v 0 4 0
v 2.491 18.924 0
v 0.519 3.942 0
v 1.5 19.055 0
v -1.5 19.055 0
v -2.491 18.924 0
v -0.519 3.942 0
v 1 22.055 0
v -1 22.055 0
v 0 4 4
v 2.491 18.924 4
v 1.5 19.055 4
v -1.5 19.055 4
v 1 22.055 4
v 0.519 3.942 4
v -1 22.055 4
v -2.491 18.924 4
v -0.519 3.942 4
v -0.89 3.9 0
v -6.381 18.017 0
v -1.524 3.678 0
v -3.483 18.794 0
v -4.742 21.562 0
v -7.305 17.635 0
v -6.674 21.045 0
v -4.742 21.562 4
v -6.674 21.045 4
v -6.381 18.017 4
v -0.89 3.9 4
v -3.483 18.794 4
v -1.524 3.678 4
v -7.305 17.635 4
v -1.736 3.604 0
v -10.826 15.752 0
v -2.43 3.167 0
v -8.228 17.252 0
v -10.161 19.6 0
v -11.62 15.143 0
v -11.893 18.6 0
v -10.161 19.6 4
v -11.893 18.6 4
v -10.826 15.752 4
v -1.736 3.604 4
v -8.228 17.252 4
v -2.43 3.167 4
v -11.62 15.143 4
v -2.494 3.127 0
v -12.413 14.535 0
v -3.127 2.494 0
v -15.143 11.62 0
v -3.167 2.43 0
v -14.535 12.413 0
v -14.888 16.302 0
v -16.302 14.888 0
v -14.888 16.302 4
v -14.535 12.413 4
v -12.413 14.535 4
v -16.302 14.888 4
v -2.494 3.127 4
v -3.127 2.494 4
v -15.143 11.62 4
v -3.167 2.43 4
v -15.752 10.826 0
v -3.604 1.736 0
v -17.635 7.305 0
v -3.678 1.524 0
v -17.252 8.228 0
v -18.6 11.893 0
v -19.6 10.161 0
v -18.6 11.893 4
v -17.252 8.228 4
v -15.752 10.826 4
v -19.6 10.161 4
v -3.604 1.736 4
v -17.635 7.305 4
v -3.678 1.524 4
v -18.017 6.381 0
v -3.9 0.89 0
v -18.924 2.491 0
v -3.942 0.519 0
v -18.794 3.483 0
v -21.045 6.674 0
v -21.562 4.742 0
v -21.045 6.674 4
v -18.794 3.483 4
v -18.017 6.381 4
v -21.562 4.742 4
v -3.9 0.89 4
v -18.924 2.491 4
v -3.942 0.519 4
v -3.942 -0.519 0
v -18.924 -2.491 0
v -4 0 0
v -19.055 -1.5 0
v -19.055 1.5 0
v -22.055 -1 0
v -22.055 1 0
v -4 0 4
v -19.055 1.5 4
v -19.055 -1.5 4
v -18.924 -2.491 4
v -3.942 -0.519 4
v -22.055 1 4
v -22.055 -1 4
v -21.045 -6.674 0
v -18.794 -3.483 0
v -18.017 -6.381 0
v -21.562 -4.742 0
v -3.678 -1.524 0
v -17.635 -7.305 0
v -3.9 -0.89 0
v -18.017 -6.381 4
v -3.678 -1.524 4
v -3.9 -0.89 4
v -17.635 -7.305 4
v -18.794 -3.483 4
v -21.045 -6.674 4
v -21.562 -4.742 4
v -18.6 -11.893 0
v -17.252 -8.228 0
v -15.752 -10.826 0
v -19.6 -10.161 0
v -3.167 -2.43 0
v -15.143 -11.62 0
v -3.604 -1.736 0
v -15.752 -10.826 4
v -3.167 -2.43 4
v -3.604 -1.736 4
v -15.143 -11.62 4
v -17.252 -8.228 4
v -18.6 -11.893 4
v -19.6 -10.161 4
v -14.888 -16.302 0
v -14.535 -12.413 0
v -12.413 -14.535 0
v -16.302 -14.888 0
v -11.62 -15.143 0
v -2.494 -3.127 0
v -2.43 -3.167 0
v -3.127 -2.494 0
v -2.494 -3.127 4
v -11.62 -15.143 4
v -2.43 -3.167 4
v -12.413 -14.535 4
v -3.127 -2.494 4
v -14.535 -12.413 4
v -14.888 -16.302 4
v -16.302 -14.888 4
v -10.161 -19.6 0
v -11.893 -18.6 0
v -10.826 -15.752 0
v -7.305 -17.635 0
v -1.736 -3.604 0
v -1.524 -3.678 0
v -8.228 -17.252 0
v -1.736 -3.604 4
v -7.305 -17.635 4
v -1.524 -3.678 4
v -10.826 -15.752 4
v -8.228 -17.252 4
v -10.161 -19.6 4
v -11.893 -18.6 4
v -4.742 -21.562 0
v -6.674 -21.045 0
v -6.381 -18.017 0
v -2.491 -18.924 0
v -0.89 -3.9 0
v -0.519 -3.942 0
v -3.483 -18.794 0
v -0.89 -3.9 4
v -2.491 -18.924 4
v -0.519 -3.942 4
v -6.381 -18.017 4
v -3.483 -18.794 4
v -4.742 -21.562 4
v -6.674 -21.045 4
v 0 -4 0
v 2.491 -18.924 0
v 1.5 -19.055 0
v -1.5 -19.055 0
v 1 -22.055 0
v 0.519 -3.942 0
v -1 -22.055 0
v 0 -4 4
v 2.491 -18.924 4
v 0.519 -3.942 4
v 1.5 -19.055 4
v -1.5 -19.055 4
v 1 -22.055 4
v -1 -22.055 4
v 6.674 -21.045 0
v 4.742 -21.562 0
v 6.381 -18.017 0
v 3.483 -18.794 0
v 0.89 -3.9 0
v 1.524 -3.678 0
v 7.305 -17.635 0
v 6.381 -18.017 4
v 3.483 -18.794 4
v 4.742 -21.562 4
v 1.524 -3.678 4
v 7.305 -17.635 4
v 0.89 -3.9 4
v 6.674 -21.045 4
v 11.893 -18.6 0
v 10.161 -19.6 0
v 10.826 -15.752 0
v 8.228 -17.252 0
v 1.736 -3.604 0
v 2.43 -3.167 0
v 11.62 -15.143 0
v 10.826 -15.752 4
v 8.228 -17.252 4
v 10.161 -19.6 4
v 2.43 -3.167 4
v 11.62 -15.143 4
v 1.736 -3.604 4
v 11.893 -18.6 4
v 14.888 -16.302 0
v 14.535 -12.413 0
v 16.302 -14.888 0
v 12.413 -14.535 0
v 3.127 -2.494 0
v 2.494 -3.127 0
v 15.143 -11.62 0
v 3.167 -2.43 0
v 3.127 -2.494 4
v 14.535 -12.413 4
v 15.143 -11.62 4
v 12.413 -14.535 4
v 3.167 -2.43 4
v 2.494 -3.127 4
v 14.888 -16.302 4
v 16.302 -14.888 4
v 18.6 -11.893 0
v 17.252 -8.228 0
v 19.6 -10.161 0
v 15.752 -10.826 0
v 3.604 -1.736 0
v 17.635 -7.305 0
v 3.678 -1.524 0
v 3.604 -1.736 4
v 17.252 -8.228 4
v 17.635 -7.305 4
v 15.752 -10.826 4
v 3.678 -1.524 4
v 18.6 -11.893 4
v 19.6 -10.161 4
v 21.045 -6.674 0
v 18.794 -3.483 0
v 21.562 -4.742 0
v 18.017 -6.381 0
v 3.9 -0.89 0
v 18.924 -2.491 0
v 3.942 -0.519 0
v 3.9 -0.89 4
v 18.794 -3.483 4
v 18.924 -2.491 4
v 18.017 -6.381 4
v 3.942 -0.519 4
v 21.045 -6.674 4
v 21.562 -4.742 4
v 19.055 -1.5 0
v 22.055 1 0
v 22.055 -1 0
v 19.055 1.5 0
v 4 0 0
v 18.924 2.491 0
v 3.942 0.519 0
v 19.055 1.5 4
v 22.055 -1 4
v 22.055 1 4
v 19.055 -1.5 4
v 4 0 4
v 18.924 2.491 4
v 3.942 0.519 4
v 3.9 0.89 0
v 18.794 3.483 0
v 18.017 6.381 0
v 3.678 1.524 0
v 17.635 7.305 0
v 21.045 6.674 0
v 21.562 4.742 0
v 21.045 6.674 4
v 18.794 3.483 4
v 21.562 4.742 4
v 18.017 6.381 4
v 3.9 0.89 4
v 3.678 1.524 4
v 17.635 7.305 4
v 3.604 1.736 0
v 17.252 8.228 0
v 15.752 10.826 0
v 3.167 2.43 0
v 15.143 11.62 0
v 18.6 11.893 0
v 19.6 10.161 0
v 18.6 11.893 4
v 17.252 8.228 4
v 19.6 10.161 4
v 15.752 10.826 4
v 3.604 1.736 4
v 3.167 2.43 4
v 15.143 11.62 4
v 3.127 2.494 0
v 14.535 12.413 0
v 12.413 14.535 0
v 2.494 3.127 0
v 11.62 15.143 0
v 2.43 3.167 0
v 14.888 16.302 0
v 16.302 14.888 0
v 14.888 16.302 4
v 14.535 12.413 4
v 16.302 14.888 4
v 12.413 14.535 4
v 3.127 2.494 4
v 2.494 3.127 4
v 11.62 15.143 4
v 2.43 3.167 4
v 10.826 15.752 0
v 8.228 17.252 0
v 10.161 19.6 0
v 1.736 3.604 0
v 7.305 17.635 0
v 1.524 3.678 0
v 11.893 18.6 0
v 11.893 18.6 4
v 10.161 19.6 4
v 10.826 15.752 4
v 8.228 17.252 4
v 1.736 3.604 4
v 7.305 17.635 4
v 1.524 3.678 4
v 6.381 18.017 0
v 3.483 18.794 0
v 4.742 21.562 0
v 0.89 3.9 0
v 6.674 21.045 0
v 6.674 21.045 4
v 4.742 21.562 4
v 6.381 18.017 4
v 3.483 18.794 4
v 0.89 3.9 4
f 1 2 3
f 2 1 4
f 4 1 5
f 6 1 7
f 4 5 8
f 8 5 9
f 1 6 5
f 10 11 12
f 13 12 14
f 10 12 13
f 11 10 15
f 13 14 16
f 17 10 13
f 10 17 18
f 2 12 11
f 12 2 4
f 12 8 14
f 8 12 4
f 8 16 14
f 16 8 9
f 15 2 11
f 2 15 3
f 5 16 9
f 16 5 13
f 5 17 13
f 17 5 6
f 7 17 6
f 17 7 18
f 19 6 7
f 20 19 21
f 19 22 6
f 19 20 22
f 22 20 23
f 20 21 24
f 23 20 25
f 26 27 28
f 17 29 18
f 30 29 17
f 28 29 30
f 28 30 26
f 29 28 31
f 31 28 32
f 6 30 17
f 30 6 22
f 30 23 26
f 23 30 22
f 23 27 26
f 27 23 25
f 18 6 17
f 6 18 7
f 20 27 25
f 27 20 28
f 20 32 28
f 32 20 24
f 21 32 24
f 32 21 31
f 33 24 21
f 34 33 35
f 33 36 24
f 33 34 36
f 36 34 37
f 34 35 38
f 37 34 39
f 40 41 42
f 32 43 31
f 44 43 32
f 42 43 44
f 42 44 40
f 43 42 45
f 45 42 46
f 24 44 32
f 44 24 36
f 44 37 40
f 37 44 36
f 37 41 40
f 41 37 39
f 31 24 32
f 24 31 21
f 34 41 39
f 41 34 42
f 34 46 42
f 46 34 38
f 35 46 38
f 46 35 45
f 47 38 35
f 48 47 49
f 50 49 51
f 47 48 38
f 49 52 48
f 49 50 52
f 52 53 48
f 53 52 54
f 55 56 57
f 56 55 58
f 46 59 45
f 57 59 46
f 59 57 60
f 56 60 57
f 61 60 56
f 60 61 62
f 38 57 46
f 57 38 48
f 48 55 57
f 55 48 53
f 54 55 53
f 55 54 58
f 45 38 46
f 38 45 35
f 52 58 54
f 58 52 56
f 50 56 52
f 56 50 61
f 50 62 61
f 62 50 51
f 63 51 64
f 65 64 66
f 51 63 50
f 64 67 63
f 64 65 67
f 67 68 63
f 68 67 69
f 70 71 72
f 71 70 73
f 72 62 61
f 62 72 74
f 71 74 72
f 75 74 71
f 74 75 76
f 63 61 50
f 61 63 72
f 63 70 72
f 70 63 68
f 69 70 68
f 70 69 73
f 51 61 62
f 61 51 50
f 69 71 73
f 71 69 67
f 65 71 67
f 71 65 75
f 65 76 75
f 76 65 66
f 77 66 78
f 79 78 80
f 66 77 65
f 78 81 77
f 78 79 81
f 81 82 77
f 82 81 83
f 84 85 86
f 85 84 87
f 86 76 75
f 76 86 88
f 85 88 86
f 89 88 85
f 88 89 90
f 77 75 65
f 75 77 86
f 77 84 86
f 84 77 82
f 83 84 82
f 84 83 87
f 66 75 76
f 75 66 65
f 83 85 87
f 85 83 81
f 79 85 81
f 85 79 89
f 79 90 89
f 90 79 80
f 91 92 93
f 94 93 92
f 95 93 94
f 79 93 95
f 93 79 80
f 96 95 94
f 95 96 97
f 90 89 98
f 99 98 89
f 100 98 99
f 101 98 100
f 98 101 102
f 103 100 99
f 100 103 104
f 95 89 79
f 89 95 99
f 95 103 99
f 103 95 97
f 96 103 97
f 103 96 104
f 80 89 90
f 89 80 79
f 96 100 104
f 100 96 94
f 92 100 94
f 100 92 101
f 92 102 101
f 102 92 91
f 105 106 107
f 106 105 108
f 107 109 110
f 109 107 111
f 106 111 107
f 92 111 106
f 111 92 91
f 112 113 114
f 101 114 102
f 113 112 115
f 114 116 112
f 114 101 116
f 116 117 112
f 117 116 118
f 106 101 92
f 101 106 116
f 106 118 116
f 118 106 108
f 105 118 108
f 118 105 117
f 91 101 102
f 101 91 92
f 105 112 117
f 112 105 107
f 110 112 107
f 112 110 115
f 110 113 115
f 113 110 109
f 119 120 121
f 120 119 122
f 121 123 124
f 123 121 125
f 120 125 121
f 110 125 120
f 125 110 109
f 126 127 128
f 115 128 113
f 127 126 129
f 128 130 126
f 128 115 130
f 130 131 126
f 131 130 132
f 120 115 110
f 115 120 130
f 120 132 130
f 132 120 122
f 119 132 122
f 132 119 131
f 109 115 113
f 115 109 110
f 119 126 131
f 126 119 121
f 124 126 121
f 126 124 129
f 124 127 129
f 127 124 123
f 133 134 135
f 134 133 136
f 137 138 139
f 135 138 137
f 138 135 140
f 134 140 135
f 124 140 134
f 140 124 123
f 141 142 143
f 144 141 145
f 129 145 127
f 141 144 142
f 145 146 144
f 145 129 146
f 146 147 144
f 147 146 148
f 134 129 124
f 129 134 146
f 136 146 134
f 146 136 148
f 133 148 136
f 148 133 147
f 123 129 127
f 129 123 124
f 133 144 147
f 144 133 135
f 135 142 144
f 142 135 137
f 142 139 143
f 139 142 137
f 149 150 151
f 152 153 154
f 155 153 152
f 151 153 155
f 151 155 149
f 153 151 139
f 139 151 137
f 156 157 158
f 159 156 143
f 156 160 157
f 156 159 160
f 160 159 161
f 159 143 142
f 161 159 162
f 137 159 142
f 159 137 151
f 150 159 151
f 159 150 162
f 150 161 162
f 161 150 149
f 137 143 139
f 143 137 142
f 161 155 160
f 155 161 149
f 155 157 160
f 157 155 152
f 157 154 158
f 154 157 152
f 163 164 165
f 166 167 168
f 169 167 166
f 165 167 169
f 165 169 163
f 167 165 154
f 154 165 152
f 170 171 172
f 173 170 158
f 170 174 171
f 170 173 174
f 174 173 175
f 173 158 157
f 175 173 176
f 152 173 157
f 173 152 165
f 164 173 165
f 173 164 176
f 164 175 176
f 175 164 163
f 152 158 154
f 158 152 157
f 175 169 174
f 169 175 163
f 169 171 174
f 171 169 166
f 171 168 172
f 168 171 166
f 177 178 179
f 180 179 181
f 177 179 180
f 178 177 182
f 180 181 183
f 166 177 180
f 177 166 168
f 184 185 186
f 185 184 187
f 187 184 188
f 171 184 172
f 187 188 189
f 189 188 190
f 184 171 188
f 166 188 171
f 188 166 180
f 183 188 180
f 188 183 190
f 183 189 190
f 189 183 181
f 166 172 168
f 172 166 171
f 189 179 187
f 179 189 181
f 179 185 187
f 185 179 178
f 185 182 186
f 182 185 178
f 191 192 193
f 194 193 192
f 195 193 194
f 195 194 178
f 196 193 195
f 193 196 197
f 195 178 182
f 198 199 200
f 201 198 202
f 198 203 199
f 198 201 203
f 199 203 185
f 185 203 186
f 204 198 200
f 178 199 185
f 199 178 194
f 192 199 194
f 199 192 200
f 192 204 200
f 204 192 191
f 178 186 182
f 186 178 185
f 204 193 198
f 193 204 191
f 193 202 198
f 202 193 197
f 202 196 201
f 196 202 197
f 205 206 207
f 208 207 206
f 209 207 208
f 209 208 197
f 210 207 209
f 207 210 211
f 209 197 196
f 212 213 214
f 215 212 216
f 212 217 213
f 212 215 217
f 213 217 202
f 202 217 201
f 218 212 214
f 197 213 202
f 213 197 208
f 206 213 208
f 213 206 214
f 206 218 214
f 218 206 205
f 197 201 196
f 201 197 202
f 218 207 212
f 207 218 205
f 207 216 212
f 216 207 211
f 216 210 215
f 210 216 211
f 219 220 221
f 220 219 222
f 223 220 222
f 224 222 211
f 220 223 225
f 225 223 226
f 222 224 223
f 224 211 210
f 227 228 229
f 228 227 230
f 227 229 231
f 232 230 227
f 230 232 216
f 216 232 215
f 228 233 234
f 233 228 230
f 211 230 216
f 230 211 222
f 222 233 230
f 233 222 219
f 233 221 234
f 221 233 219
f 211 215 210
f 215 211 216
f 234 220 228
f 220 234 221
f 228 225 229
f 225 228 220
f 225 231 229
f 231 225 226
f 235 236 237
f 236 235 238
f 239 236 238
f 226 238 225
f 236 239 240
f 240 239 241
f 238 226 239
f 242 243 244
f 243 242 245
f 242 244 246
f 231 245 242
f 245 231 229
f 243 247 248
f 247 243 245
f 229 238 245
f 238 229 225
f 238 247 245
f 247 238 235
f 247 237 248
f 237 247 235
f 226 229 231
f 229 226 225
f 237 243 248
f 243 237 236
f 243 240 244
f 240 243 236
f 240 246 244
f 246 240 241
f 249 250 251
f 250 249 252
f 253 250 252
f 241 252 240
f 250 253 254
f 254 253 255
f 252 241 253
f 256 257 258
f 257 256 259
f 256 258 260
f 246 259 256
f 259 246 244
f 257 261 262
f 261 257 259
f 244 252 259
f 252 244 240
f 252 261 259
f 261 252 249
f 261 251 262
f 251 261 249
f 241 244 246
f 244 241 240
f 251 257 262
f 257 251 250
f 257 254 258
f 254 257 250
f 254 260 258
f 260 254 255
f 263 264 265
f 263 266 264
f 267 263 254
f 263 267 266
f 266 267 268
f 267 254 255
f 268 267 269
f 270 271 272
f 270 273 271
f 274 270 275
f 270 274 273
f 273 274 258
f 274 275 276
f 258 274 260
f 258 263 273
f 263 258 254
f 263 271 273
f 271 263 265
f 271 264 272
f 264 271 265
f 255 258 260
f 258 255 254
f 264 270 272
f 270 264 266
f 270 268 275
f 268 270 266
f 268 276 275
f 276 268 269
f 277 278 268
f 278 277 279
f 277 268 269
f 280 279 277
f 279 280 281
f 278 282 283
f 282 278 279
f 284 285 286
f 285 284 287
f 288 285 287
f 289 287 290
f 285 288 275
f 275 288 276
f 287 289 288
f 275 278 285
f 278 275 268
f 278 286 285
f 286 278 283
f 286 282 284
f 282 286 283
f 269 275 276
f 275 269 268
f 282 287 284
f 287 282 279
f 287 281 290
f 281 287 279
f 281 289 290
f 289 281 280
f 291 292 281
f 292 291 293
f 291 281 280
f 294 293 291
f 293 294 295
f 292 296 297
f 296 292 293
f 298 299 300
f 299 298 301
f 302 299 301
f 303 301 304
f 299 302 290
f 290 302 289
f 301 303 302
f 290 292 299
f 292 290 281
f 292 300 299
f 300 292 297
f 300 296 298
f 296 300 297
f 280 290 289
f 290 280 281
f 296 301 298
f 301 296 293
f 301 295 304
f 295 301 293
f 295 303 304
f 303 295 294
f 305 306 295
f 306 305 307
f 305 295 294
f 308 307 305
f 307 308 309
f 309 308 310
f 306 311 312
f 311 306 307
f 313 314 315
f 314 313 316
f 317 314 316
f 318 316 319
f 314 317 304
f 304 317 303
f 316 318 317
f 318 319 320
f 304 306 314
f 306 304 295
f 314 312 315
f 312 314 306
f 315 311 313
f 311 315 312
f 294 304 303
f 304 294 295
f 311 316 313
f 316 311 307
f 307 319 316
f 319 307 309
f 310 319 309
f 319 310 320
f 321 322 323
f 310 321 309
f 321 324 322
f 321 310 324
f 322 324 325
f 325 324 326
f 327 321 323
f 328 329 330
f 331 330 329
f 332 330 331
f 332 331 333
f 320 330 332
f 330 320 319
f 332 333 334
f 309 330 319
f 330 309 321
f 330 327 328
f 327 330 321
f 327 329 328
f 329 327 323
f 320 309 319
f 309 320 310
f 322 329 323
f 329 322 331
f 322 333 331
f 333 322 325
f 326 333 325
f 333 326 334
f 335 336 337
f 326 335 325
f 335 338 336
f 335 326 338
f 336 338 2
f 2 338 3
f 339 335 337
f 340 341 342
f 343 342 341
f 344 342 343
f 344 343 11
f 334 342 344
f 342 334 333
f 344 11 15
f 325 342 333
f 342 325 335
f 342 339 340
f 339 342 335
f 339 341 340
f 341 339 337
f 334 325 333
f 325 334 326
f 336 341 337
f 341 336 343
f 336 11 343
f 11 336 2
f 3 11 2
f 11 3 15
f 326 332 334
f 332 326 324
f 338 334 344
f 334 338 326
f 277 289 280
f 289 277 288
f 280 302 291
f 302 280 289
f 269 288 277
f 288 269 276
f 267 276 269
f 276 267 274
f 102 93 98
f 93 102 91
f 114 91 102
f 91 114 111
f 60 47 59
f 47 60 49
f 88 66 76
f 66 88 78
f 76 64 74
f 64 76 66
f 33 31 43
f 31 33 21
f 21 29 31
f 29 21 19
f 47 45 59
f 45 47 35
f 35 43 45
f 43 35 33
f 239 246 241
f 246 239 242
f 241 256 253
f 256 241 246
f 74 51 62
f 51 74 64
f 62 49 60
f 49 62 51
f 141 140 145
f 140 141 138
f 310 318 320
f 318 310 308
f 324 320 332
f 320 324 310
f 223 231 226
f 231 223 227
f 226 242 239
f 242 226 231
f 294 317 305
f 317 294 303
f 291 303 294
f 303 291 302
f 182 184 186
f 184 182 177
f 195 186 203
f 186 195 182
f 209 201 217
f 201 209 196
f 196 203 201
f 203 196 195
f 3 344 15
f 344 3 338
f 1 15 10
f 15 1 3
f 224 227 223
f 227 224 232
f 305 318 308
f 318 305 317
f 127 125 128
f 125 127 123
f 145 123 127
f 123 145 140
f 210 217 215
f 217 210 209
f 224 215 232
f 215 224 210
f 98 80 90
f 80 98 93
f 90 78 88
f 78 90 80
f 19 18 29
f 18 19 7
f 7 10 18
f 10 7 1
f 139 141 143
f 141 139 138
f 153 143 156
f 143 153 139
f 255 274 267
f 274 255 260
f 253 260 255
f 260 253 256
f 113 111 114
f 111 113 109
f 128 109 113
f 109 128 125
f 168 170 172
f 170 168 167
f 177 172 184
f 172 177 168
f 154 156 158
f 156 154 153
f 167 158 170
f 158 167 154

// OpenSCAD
// Spur Gear Generator, V1.0
// Damon Printz
// 15 February 2014

// --------------INPUT-----------------------------
teeth = 24;   // number of teeth on gear
base = 3 / 2; // 1/2 length of base of tooth
top = 2 / 2;  // 1/2 length of top of tooth
height = 3;   // height of tooth
thick = 4;    // thickness of gear
hole = 4;     // radius of hole

//--------------PROGRAM----------------------------
// calculated variables
theta = 180 / teeth; // angle between midpoint perpendicular lines
spaceD = (base + top * cos(theta)) / sin(theta); // radius from midpoint of space to center of gear
baseD = spaceD * cos(theta) + top * sin(theta); // radius from midpoint of tooth baseline to center of gear
//echo("space radius = ");
//echo(spaceD);
//echo("base radius = ");
//echo(baseD);
//echo("theta = ");
//echo(theta);
mR = baseD + height / 2;
echo("Tooth Mesh Radius =");
echo(mR);
echo("Contact Circumference =");
echo(2 * 3.14 * mR);
gP = atan((base - top)/2 / height);
echo("Tooth Angle = ");
echo(gP);



module buildTooth()
{
  linear_extrude(thick, center = false, convexity = 1) polygon([[0,0],[0, baseD + height],[top, baseD + height],[base, baseD],[spaceD * sin(theta), spaceD * cos(theta)],[0,0]]);
  linear_extrude(thick, center = false, convexity = 1) mirror([1,0,0]) polygon([[0,0],[0, baseD + height],[top, baseD + height],[base, baseD],[spaceD * sin(theta), spaceD * cos(theta)],[0,0]]);
}
//translate([0,0, thick + 4])buildTooth();
difference()
{
  for(i = [0:theta*2:360])
  {
    rotate([0,0,i])buildTooth();
  }
  translate([0,0,-1]) cylinder(h = thick + 2, r = hole, $fn = 7 * hole);
}
